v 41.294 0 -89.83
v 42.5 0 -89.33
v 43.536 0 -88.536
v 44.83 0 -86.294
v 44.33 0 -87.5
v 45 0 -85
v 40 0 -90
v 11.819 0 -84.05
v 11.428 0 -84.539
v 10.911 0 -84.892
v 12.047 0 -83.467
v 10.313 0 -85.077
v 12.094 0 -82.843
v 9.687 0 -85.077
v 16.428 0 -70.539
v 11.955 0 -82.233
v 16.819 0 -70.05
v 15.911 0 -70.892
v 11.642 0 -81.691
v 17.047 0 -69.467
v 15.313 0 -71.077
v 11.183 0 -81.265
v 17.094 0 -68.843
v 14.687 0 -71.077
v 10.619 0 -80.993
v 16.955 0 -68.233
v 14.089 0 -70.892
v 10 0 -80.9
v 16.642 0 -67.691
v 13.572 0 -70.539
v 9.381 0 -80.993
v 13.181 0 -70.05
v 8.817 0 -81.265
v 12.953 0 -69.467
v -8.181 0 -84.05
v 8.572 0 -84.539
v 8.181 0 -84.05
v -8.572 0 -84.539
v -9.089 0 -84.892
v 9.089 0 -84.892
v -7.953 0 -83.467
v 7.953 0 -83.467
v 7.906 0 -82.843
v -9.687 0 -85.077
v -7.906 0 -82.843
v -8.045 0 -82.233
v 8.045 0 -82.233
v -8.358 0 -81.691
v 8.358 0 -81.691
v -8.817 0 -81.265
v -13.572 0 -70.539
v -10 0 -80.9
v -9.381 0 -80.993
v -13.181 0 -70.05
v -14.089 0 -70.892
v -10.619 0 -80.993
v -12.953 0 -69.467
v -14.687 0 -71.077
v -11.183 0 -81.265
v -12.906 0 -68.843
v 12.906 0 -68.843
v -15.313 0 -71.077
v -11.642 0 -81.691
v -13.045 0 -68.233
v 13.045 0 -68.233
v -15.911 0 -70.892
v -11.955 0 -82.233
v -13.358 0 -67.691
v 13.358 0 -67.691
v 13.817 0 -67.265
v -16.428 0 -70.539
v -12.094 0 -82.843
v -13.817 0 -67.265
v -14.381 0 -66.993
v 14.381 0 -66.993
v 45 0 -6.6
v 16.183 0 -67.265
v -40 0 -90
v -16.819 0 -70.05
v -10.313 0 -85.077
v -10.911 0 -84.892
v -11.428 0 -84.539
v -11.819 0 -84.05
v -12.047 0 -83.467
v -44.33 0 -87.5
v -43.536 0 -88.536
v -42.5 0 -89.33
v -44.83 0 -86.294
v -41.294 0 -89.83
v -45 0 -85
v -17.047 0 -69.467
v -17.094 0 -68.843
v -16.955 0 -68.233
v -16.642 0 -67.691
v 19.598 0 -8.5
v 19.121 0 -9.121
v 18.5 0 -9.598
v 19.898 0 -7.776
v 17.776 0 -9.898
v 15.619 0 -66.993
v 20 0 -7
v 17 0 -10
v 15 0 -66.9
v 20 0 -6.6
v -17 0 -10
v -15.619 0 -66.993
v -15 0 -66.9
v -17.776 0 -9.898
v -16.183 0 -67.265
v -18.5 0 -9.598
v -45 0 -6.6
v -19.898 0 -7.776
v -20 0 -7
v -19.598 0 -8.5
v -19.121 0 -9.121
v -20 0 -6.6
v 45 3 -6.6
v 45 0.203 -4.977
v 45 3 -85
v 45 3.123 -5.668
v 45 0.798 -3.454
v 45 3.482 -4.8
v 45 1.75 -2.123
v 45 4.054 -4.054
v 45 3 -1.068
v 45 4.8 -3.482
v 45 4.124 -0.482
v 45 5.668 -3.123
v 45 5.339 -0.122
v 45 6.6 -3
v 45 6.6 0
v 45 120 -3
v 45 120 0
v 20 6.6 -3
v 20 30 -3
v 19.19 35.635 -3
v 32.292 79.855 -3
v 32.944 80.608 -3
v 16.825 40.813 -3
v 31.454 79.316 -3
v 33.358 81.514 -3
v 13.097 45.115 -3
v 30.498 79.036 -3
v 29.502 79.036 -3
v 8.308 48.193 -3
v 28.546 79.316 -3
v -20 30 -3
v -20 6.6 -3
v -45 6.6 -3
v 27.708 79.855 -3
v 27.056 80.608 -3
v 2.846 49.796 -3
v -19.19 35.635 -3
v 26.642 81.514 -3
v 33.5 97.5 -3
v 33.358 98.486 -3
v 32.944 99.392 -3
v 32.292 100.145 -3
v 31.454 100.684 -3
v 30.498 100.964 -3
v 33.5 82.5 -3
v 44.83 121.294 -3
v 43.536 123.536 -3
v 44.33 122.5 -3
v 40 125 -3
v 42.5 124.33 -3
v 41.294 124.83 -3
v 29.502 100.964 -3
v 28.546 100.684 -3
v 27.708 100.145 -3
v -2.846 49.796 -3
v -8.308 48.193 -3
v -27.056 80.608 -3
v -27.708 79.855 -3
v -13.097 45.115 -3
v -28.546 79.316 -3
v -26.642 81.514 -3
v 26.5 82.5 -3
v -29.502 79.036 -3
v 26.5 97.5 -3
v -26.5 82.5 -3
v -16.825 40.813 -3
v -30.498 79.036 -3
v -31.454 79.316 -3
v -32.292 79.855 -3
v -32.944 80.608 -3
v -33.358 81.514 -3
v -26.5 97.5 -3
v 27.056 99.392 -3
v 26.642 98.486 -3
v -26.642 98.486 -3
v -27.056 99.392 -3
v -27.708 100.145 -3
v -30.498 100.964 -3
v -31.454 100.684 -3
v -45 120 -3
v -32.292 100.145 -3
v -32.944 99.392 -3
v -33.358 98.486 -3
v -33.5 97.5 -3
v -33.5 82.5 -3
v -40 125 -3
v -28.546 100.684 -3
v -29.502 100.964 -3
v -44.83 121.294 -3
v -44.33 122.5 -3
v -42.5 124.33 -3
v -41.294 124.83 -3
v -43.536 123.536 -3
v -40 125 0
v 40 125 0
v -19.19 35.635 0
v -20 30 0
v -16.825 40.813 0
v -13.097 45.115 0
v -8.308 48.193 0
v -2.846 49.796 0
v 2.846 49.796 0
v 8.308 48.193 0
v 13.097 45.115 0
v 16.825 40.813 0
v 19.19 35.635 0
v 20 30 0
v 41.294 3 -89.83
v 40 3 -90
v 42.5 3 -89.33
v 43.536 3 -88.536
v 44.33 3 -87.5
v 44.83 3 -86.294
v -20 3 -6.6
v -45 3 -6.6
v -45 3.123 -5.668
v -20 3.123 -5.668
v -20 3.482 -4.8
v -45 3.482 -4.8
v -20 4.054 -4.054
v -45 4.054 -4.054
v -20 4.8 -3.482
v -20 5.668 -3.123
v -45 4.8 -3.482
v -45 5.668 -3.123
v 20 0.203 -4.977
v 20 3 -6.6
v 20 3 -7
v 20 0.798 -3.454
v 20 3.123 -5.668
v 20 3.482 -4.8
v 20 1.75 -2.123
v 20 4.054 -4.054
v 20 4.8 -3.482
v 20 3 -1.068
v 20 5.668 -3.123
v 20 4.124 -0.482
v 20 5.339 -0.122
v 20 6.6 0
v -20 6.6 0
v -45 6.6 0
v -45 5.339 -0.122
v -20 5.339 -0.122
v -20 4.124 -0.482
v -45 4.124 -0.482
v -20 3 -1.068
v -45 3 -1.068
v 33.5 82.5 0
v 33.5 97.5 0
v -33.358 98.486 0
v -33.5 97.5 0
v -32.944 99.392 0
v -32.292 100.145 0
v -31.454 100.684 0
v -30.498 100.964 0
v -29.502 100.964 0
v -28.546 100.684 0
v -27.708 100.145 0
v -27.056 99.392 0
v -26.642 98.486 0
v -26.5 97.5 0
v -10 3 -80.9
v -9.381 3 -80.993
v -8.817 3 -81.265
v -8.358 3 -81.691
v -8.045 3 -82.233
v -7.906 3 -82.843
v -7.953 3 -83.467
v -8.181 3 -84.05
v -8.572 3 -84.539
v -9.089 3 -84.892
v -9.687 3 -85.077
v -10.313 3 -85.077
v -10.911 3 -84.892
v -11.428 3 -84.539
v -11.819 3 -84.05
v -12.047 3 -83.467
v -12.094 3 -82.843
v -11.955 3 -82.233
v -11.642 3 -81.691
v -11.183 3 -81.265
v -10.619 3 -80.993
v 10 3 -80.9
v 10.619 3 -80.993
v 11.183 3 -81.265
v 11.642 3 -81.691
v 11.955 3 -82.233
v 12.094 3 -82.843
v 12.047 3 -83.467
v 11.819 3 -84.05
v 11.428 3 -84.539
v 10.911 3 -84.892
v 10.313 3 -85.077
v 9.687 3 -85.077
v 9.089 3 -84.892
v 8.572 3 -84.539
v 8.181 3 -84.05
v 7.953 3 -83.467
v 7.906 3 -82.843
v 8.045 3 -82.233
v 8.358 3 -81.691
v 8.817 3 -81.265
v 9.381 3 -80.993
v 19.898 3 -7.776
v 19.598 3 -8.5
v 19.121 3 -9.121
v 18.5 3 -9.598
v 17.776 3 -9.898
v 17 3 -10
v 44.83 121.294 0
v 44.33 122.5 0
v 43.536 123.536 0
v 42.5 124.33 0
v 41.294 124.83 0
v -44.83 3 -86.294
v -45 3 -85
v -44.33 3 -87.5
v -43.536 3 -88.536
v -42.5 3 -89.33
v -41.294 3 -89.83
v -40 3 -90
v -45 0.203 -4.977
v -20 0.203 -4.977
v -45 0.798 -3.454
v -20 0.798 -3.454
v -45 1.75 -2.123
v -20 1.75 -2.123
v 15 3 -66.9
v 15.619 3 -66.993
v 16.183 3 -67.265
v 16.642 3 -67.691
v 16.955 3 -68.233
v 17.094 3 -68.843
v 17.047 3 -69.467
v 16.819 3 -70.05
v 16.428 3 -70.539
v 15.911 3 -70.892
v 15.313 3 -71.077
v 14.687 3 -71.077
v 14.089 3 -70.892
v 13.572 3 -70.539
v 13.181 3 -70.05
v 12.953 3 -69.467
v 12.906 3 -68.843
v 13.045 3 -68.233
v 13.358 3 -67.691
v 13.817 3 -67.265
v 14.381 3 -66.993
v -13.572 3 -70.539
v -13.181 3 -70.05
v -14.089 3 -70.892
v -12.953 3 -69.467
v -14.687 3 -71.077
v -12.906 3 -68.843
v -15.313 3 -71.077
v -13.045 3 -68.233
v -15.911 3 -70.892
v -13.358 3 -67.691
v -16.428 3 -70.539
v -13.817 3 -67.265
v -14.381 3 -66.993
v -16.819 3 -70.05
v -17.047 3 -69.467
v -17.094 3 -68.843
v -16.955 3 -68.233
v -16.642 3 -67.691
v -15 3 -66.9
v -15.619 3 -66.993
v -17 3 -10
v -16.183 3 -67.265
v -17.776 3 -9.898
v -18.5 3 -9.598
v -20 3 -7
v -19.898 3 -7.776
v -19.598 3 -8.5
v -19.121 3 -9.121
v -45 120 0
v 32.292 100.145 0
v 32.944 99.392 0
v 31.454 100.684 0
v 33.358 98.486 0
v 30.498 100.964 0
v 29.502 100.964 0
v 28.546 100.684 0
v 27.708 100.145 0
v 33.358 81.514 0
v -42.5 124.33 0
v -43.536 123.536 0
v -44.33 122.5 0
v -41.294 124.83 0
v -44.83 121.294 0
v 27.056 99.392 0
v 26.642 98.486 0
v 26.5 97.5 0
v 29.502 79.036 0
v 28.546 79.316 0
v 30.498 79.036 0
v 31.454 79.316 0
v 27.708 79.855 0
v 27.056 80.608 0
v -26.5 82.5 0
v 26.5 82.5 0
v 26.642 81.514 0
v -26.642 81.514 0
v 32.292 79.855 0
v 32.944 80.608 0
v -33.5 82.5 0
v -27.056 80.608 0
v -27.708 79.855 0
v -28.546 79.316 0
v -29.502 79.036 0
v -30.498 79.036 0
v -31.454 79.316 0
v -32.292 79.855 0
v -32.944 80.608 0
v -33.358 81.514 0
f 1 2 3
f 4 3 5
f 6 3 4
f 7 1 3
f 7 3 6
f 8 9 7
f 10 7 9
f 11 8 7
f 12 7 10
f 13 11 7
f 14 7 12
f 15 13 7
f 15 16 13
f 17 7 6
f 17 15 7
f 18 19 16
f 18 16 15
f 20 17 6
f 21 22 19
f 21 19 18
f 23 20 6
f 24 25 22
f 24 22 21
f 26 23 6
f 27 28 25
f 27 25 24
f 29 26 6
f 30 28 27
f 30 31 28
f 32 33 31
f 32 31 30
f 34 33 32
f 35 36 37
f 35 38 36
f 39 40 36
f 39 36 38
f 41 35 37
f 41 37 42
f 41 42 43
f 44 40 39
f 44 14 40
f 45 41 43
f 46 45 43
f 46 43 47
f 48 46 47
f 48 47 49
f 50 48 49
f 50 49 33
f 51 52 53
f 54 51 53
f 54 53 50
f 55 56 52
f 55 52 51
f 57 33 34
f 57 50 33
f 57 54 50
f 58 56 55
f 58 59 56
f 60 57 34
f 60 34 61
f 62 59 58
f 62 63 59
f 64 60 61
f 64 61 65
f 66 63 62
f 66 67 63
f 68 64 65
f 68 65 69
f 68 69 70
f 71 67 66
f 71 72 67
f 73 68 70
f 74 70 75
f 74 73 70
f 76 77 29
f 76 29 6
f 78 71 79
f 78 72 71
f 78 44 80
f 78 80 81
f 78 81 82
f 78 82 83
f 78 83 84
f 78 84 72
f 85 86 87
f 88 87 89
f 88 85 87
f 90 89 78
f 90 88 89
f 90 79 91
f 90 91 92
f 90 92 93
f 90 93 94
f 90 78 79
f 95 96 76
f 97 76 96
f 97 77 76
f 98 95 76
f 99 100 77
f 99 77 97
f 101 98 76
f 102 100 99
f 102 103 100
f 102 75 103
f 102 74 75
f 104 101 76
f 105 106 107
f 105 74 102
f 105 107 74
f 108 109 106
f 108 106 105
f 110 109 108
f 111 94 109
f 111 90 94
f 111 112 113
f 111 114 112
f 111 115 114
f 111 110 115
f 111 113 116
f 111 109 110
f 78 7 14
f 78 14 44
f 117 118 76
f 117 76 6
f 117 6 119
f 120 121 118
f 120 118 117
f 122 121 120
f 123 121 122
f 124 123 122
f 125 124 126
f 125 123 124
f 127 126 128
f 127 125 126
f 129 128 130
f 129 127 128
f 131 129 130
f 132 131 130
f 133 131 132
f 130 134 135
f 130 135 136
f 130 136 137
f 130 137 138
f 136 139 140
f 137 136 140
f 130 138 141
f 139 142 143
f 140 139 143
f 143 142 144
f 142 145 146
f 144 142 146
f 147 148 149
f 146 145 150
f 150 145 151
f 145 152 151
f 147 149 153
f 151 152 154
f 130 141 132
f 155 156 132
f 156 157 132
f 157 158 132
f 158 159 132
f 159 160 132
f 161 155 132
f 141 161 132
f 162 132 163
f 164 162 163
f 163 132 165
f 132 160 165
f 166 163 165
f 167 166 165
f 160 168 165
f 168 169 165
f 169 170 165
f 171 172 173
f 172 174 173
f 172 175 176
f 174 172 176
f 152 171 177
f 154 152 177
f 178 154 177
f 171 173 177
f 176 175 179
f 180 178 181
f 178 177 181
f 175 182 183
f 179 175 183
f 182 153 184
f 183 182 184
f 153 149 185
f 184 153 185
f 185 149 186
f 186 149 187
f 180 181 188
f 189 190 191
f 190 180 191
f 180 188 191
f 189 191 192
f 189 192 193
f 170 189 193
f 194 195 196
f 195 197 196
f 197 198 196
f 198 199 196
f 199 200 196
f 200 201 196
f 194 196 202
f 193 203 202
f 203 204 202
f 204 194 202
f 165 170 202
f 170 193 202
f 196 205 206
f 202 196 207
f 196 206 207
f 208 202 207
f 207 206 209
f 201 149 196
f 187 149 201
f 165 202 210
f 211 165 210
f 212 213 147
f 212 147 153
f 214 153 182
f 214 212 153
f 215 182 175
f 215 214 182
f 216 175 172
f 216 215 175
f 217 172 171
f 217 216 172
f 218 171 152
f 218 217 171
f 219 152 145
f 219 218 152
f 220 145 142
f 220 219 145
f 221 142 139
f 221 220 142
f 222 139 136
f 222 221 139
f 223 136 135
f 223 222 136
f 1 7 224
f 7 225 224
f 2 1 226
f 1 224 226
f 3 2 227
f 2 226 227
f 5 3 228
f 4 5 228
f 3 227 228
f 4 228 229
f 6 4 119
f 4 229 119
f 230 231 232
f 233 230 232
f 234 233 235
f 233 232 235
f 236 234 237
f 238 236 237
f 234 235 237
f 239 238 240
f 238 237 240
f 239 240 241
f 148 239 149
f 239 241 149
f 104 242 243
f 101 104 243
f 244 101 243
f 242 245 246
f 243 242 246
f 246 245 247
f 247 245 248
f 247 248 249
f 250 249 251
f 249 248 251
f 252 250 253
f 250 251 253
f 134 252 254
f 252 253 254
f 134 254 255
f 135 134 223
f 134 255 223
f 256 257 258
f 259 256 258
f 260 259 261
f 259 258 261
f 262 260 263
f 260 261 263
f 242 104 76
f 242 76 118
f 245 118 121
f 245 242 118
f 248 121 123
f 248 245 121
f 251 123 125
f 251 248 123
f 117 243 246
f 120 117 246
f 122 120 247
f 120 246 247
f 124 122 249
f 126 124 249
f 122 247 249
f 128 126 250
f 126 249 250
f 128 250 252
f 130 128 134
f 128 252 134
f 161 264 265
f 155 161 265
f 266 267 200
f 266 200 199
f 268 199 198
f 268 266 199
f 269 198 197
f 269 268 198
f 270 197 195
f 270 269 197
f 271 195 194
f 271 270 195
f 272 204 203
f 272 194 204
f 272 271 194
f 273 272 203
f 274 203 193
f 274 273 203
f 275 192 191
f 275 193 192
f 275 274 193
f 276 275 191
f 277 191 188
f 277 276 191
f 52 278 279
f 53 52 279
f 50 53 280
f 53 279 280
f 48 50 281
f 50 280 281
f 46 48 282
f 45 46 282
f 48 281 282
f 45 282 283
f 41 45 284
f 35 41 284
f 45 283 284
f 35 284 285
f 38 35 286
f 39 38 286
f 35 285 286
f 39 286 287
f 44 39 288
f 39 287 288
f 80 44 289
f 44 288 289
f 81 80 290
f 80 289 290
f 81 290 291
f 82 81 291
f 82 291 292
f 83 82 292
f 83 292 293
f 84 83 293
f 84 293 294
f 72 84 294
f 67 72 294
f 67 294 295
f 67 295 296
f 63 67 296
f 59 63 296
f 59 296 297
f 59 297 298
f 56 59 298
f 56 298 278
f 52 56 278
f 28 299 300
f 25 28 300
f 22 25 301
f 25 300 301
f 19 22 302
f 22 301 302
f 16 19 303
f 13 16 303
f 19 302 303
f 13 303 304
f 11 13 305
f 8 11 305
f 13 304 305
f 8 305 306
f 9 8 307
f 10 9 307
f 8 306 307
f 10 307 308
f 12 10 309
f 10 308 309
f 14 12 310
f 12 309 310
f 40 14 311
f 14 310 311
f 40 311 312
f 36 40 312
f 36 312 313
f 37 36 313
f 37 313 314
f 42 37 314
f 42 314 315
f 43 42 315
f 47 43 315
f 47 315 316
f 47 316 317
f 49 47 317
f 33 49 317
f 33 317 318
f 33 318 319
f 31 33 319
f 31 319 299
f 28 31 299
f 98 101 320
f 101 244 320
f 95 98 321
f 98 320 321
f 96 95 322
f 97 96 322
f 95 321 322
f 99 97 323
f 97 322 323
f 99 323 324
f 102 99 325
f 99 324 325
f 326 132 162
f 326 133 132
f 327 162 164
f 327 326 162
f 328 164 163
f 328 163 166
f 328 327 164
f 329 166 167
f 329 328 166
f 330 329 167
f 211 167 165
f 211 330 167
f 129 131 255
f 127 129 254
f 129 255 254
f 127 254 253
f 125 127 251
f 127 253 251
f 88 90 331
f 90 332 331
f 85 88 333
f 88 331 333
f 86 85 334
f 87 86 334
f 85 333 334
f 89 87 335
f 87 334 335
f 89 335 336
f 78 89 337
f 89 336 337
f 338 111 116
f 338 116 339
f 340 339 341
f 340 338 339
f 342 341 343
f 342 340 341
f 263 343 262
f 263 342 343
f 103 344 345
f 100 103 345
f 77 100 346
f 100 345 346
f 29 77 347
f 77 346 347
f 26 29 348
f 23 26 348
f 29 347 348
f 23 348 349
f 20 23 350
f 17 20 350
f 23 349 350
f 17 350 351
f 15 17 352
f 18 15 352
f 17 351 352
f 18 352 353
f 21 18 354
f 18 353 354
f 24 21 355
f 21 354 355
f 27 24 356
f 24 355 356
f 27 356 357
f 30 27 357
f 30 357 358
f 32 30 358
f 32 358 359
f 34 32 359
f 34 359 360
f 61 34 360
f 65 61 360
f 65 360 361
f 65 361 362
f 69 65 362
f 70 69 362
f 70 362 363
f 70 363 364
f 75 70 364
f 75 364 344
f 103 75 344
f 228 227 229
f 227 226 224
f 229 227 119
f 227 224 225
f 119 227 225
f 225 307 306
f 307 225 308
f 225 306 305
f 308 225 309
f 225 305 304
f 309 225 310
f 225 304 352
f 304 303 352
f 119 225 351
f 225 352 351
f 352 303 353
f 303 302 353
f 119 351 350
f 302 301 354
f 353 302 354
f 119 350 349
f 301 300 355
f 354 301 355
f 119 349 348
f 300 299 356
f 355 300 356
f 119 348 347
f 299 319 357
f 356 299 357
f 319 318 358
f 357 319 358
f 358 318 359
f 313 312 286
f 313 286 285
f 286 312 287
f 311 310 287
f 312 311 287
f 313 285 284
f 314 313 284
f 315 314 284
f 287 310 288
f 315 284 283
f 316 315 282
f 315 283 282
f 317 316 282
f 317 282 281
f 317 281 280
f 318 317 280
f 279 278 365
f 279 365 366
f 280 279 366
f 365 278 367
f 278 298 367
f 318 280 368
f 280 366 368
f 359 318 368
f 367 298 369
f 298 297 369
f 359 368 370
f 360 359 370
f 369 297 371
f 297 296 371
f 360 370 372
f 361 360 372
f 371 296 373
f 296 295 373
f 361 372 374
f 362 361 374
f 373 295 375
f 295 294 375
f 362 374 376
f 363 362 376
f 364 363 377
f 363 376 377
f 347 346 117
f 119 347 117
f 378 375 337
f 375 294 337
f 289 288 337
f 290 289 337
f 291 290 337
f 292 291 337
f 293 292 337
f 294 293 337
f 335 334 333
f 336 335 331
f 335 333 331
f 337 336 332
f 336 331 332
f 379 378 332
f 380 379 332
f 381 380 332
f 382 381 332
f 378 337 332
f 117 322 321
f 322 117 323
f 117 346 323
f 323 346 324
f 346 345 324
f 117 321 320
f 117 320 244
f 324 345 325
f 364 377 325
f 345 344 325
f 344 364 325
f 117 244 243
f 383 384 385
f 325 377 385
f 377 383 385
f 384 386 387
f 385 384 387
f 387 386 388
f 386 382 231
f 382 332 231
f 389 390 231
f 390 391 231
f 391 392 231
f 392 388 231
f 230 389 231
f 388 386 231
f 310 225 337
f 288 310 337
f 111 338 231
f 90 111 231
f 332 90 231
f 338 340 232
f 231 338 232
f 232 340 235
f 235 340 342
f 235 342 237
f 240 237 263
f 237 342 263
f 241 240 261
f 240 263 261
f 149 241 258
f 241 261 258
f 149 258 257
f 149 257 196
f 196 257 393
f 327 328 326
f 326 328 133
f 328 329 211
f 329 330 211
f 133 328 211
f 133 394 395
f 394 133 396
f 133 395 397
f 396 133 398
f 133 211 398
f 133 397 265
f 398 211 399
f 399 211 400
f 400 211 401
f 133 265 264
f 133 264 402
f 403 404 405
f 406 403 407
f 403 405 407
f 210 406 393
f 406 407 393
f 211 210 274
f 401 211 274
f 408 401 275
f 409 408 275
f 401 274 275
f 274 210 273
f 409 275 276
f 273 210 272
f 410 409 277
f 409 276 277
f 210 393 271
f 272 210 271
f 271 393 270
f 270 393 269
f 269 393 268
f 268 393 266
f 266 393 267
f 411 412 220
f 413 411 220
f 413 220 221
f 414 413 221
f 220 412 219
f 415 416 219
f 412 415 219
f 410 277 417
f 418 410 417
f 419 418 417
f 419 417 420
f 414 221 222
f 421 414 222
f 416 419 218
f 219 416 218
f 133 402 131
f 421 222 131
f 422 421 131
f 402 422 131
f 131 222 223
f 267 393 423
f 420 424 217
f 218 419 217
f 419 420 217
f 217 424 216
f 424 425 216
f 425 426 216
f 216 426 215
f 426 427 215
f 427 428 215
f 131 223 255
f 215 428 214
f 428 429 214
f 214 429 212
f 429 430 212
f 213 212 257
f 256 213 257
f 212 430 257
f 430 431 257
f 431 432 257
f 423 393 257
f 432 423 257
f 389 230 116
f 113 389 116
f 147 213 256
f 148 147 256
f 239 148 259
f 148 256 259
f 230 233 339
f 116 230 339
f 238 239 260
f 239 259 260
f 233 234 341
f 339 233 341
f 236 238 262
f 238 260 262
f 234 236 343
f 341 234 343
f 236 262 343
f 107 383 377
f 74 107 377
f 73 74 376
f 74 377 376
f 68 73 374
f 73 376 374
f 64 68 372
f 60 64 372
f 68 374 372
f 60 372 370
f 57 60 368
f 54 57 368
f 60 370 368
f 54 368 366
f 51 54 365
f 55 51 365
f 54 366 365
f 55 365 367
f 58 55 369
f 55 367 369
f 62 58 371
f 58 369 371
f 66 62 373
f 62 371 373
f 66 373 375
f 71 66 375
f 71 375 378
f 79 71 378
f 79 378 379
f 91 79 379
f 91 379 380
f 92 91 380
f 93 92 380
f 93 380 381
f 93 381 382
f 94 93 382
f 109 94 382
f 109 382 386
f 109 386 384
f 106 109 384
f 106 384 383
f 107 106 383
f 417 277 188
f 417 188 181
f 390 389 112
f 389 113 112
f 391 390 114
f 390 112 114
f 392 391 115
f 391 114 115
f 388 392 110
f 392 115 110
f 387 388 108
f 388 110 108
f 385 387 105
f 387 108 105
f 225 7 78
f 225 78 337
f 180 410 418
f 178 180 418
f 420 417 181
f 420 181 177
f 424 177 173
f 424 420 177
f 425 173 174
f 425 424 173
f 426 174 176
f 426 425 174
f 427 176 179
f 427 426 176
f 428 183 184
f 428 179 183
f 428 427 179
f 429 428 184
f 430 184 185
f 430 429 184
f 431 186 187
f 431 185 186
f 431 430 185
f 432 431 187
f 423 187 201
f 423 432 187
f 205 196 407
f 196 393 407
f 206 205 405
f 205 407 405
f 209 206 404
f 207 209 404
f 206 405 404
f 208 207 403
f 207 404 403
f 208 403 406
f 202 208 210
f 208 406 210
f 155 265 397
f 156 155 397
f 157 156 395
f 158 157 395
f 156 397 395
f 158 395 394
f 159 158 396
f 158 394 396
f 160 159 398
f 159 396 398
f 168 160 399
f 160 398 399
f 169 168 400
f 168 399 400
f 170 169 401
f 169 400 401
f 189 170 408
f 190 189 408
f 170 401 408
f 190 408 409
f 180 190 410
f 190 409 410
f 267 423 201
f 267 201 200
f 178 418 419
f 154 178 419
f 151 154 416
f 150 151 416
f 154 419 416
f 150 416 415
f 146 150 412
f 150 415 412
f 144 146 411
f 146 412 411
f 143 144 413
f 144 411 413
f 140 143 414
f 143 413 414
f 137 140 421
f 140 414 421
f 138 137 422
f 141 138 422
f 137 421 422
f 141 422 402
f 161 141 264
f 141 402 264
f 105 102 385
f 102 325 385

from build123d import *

# Parameters (mm, degrees)
BOSS_EXTRUDE1_DEPTH        = 45
FLATTEN_BENDS1_START       = -45
FLATTEN_BENDS1_OUTLINE_W   = 122
FLATTEN_BENDS1_OUTLINE_H   = 3
FLATTEN_BENDS1_DEPTH       = 90
FLATTEN_BENDS1_2_OUTLINE_W = 3
FLATTEN_BENDS1_2_OUTLINE_H = 119.533030317
FLATTEN_BENDS1_2_DEPTH     = 90
PROCESS_BENDS1_START       = -45
PROCESS_BENDS1_DEPTH       = 90
PROCESS_BENDS1_2_DEPTH     = 90
SKETCH8_W                  = 40
SKETCH8_H                  = 6.6
SKETCH8_H_2                = 23.4
CUT_EXTRUDE1_DEPTH         = 10
FILLET1_R                  = 3
FILLET2_R                  = 5
CUT_EXTRUDE2_DEPTH         = 80
SKETCH10_R                 = 2.1
CUT_EXTRUDE3_DEPTH         = 80


# Read off the part's stored shape, not the designer's step: Flatten-Bends1, Process-Bends1
with BuildPart() as part:
    # Sketch1 → Boss-Extrude1 (new, symmetric)
    with BuildSketch(Plane(origin=(0, 0, 0), x_dir=(0, 0, -1), z_dir=(1, 0, 0))):
        Polygon((0, 125), (0, 0), (90, 0), (90, 3), (3, 3), (3, 125), align=None)
    extrude(amount=BOSS_EXTRUDE1_DEPTH, both=True)

    # Flatten-Bends1 outline → Flatten-Bends1 (cut)
    with BuildSketch(Plane.YZ.offset(FLATTEN_BENDS1_START)):
        with Locations((64, -1.5)):
            Rectangle(FLATTEN_BENDS1_OUTLINE_W, FLATTEN_BENDS1_OUTLINE_H)
    extrude(amount=FLATTEN_BENDS1_DEPTH, mode=Mode.SUBTRACT)

    # Flatten-Bends1 2 outline → Flatten-Bends1 2 (add)
    with BuildSketch(Plane.YZ.offset(FLATTEN_BENDS1_START)):
        with Locations((1.5, 59.766515159)):
            Rectangle(FLATTEN_BENDS1_2_OUTLINE_W, FLATTEN_BENDS1_2_OUTLINE_H)
    extrude(amount=FLATTEN_BENDS1_2_DEPTH)

    # Process-Bends1 outline → Process-Bends1 (cut)
    with BuildSketch(Plane.YZ.offset(PROCESS_BENDS1_START)):
        with BuildLine():
            ThreePointArc((0, -6.6), (0.798276118, -3.453573455), (3, -1.068273325))
            Line((3, -1.068273325), (3, 119.533030317))
            Line((3, 119.533030317), (0, 119.533030317))
            Line((0, 119.533030317), (0, -6.6))
        make_face()
    extrude(amount=PROCESS_BENDS1_DEPTH, mode=Mode.SUBTRACT)

    # Process-Bends1 2 outline → Process-Bends1 2 (add)
    with BuildSketch(Plane.YZ.offset(PROCESS_BENDS1_START)):
        with BuildLine():
            Line((6.6, -3), (125, -3))
            Line((125, -3), (125, 0))
            Line((125, 0), (6.6, 0))
            ThreePointArc((6.6, 0), (4.722421247, -0.272702154), (3, -1.068273325))
            Line((3, -1.068273325), (3, -6.6))
            ThreePointArc((3, -6.6), (4.054415588, -4.054415588), (6.6, -3))
        make_face()
    extrude(amount=PROCESS_BENDS1_2_DEPTH)

    # Sketch8 → Cut-Extrude1 (cut)
    with BuildSketch(Plane.XY):
        with BuildLine():
            ThreePointArc((-20, 30), (0, 50), (20, 30))
            Line((20, 30), (-20, 30))
        make_face()
        with Locations((0, 3.3)):
            Rectangle(SKETCH8_W, SKETCH8_H)
        with Locations((0, 18.3)):
            Rectangle(SKETCH8_W, SKETCH8_H_2)
    extrude(amount=-CUT_EXTRUDE1_DEPTH, mode=Mode.SUBTRACT)

    # Fillet1
    fillet1_edges = [part.edges().sort_by_distance(p)[0] for p in [
        (-20, 1.5, -10),
        (20, 1.5, -10),
    ]]
    fillet(fillet1_edges, radius=FILLET1_R)

    # Fillet2
    fillet2_edges = [part.edges().sort_by_distance(p)[0] for p in [
        (-45, 125, -1.5),
        (45, 125, -1.5),
        (45, 1.5, -90),
        (-45, 1.5, -90),
    ]]
    fillet(fillet2_edges, radius=FILLET2_R)

    # Sketch9 → Cut-Extrude2 (cut)
    with BuildSketch(Plane.XY):
        with BuildLine():
            Line((-26.5, 97.5), (-26.5, 82.5))
            ThreePointArc((-26.5, 82.5), (-30, 79), (-33.5, 82.5))
            Line((-33.5, 82.5), (-33.5, 97.5))
            ThreePointArc((-33.5, 97.5), (-30, 101), (-26.5, 97.5))
        make_face()
        with BuildLine():
            Line((26.5, 97.5), (26.5, 82.5))
            ThreePointArc((26.5, 82.5), (30, 79), (33.5, 82.5))
            Line((33.5, 82.5), (33.5, 97.5))
            ThreePointArc((33.5, 97.5), (30, 101), (26.5, 97.5))
        make_face()
    extrude(amount=-CUT_EXTRUDE2_DEPTH, mode=Mode.SUBTRACT)

    # Sketch10 → Cut-Extrude3 (cut)
    with BuildSketch(Plane(origin=(0, 3, 0), x_dir=(1, 0, 0), z_dir=(0, 1, 0))):
        with Locations(Location((-10, 83, 0), (0, 0, 270))):
            Circle(SKETCH10_R)
        with Locations(Location((10, 83, 0), (0, 0, 270))):
            Circle(SKETCH10_R)
        with Locations(Location((-15, 69, 0), (0, 0, 270))):
            Circle(SKETCH10_R)
        with Locations(Location((15, 69, 0), (0, 0, 270))):
            Circle(SKETCH10_R)
    extrude(amount=-CUT_EXTRUDE3_DEPTH, mode=Mode.SUBTRACT)


solid = part.part
